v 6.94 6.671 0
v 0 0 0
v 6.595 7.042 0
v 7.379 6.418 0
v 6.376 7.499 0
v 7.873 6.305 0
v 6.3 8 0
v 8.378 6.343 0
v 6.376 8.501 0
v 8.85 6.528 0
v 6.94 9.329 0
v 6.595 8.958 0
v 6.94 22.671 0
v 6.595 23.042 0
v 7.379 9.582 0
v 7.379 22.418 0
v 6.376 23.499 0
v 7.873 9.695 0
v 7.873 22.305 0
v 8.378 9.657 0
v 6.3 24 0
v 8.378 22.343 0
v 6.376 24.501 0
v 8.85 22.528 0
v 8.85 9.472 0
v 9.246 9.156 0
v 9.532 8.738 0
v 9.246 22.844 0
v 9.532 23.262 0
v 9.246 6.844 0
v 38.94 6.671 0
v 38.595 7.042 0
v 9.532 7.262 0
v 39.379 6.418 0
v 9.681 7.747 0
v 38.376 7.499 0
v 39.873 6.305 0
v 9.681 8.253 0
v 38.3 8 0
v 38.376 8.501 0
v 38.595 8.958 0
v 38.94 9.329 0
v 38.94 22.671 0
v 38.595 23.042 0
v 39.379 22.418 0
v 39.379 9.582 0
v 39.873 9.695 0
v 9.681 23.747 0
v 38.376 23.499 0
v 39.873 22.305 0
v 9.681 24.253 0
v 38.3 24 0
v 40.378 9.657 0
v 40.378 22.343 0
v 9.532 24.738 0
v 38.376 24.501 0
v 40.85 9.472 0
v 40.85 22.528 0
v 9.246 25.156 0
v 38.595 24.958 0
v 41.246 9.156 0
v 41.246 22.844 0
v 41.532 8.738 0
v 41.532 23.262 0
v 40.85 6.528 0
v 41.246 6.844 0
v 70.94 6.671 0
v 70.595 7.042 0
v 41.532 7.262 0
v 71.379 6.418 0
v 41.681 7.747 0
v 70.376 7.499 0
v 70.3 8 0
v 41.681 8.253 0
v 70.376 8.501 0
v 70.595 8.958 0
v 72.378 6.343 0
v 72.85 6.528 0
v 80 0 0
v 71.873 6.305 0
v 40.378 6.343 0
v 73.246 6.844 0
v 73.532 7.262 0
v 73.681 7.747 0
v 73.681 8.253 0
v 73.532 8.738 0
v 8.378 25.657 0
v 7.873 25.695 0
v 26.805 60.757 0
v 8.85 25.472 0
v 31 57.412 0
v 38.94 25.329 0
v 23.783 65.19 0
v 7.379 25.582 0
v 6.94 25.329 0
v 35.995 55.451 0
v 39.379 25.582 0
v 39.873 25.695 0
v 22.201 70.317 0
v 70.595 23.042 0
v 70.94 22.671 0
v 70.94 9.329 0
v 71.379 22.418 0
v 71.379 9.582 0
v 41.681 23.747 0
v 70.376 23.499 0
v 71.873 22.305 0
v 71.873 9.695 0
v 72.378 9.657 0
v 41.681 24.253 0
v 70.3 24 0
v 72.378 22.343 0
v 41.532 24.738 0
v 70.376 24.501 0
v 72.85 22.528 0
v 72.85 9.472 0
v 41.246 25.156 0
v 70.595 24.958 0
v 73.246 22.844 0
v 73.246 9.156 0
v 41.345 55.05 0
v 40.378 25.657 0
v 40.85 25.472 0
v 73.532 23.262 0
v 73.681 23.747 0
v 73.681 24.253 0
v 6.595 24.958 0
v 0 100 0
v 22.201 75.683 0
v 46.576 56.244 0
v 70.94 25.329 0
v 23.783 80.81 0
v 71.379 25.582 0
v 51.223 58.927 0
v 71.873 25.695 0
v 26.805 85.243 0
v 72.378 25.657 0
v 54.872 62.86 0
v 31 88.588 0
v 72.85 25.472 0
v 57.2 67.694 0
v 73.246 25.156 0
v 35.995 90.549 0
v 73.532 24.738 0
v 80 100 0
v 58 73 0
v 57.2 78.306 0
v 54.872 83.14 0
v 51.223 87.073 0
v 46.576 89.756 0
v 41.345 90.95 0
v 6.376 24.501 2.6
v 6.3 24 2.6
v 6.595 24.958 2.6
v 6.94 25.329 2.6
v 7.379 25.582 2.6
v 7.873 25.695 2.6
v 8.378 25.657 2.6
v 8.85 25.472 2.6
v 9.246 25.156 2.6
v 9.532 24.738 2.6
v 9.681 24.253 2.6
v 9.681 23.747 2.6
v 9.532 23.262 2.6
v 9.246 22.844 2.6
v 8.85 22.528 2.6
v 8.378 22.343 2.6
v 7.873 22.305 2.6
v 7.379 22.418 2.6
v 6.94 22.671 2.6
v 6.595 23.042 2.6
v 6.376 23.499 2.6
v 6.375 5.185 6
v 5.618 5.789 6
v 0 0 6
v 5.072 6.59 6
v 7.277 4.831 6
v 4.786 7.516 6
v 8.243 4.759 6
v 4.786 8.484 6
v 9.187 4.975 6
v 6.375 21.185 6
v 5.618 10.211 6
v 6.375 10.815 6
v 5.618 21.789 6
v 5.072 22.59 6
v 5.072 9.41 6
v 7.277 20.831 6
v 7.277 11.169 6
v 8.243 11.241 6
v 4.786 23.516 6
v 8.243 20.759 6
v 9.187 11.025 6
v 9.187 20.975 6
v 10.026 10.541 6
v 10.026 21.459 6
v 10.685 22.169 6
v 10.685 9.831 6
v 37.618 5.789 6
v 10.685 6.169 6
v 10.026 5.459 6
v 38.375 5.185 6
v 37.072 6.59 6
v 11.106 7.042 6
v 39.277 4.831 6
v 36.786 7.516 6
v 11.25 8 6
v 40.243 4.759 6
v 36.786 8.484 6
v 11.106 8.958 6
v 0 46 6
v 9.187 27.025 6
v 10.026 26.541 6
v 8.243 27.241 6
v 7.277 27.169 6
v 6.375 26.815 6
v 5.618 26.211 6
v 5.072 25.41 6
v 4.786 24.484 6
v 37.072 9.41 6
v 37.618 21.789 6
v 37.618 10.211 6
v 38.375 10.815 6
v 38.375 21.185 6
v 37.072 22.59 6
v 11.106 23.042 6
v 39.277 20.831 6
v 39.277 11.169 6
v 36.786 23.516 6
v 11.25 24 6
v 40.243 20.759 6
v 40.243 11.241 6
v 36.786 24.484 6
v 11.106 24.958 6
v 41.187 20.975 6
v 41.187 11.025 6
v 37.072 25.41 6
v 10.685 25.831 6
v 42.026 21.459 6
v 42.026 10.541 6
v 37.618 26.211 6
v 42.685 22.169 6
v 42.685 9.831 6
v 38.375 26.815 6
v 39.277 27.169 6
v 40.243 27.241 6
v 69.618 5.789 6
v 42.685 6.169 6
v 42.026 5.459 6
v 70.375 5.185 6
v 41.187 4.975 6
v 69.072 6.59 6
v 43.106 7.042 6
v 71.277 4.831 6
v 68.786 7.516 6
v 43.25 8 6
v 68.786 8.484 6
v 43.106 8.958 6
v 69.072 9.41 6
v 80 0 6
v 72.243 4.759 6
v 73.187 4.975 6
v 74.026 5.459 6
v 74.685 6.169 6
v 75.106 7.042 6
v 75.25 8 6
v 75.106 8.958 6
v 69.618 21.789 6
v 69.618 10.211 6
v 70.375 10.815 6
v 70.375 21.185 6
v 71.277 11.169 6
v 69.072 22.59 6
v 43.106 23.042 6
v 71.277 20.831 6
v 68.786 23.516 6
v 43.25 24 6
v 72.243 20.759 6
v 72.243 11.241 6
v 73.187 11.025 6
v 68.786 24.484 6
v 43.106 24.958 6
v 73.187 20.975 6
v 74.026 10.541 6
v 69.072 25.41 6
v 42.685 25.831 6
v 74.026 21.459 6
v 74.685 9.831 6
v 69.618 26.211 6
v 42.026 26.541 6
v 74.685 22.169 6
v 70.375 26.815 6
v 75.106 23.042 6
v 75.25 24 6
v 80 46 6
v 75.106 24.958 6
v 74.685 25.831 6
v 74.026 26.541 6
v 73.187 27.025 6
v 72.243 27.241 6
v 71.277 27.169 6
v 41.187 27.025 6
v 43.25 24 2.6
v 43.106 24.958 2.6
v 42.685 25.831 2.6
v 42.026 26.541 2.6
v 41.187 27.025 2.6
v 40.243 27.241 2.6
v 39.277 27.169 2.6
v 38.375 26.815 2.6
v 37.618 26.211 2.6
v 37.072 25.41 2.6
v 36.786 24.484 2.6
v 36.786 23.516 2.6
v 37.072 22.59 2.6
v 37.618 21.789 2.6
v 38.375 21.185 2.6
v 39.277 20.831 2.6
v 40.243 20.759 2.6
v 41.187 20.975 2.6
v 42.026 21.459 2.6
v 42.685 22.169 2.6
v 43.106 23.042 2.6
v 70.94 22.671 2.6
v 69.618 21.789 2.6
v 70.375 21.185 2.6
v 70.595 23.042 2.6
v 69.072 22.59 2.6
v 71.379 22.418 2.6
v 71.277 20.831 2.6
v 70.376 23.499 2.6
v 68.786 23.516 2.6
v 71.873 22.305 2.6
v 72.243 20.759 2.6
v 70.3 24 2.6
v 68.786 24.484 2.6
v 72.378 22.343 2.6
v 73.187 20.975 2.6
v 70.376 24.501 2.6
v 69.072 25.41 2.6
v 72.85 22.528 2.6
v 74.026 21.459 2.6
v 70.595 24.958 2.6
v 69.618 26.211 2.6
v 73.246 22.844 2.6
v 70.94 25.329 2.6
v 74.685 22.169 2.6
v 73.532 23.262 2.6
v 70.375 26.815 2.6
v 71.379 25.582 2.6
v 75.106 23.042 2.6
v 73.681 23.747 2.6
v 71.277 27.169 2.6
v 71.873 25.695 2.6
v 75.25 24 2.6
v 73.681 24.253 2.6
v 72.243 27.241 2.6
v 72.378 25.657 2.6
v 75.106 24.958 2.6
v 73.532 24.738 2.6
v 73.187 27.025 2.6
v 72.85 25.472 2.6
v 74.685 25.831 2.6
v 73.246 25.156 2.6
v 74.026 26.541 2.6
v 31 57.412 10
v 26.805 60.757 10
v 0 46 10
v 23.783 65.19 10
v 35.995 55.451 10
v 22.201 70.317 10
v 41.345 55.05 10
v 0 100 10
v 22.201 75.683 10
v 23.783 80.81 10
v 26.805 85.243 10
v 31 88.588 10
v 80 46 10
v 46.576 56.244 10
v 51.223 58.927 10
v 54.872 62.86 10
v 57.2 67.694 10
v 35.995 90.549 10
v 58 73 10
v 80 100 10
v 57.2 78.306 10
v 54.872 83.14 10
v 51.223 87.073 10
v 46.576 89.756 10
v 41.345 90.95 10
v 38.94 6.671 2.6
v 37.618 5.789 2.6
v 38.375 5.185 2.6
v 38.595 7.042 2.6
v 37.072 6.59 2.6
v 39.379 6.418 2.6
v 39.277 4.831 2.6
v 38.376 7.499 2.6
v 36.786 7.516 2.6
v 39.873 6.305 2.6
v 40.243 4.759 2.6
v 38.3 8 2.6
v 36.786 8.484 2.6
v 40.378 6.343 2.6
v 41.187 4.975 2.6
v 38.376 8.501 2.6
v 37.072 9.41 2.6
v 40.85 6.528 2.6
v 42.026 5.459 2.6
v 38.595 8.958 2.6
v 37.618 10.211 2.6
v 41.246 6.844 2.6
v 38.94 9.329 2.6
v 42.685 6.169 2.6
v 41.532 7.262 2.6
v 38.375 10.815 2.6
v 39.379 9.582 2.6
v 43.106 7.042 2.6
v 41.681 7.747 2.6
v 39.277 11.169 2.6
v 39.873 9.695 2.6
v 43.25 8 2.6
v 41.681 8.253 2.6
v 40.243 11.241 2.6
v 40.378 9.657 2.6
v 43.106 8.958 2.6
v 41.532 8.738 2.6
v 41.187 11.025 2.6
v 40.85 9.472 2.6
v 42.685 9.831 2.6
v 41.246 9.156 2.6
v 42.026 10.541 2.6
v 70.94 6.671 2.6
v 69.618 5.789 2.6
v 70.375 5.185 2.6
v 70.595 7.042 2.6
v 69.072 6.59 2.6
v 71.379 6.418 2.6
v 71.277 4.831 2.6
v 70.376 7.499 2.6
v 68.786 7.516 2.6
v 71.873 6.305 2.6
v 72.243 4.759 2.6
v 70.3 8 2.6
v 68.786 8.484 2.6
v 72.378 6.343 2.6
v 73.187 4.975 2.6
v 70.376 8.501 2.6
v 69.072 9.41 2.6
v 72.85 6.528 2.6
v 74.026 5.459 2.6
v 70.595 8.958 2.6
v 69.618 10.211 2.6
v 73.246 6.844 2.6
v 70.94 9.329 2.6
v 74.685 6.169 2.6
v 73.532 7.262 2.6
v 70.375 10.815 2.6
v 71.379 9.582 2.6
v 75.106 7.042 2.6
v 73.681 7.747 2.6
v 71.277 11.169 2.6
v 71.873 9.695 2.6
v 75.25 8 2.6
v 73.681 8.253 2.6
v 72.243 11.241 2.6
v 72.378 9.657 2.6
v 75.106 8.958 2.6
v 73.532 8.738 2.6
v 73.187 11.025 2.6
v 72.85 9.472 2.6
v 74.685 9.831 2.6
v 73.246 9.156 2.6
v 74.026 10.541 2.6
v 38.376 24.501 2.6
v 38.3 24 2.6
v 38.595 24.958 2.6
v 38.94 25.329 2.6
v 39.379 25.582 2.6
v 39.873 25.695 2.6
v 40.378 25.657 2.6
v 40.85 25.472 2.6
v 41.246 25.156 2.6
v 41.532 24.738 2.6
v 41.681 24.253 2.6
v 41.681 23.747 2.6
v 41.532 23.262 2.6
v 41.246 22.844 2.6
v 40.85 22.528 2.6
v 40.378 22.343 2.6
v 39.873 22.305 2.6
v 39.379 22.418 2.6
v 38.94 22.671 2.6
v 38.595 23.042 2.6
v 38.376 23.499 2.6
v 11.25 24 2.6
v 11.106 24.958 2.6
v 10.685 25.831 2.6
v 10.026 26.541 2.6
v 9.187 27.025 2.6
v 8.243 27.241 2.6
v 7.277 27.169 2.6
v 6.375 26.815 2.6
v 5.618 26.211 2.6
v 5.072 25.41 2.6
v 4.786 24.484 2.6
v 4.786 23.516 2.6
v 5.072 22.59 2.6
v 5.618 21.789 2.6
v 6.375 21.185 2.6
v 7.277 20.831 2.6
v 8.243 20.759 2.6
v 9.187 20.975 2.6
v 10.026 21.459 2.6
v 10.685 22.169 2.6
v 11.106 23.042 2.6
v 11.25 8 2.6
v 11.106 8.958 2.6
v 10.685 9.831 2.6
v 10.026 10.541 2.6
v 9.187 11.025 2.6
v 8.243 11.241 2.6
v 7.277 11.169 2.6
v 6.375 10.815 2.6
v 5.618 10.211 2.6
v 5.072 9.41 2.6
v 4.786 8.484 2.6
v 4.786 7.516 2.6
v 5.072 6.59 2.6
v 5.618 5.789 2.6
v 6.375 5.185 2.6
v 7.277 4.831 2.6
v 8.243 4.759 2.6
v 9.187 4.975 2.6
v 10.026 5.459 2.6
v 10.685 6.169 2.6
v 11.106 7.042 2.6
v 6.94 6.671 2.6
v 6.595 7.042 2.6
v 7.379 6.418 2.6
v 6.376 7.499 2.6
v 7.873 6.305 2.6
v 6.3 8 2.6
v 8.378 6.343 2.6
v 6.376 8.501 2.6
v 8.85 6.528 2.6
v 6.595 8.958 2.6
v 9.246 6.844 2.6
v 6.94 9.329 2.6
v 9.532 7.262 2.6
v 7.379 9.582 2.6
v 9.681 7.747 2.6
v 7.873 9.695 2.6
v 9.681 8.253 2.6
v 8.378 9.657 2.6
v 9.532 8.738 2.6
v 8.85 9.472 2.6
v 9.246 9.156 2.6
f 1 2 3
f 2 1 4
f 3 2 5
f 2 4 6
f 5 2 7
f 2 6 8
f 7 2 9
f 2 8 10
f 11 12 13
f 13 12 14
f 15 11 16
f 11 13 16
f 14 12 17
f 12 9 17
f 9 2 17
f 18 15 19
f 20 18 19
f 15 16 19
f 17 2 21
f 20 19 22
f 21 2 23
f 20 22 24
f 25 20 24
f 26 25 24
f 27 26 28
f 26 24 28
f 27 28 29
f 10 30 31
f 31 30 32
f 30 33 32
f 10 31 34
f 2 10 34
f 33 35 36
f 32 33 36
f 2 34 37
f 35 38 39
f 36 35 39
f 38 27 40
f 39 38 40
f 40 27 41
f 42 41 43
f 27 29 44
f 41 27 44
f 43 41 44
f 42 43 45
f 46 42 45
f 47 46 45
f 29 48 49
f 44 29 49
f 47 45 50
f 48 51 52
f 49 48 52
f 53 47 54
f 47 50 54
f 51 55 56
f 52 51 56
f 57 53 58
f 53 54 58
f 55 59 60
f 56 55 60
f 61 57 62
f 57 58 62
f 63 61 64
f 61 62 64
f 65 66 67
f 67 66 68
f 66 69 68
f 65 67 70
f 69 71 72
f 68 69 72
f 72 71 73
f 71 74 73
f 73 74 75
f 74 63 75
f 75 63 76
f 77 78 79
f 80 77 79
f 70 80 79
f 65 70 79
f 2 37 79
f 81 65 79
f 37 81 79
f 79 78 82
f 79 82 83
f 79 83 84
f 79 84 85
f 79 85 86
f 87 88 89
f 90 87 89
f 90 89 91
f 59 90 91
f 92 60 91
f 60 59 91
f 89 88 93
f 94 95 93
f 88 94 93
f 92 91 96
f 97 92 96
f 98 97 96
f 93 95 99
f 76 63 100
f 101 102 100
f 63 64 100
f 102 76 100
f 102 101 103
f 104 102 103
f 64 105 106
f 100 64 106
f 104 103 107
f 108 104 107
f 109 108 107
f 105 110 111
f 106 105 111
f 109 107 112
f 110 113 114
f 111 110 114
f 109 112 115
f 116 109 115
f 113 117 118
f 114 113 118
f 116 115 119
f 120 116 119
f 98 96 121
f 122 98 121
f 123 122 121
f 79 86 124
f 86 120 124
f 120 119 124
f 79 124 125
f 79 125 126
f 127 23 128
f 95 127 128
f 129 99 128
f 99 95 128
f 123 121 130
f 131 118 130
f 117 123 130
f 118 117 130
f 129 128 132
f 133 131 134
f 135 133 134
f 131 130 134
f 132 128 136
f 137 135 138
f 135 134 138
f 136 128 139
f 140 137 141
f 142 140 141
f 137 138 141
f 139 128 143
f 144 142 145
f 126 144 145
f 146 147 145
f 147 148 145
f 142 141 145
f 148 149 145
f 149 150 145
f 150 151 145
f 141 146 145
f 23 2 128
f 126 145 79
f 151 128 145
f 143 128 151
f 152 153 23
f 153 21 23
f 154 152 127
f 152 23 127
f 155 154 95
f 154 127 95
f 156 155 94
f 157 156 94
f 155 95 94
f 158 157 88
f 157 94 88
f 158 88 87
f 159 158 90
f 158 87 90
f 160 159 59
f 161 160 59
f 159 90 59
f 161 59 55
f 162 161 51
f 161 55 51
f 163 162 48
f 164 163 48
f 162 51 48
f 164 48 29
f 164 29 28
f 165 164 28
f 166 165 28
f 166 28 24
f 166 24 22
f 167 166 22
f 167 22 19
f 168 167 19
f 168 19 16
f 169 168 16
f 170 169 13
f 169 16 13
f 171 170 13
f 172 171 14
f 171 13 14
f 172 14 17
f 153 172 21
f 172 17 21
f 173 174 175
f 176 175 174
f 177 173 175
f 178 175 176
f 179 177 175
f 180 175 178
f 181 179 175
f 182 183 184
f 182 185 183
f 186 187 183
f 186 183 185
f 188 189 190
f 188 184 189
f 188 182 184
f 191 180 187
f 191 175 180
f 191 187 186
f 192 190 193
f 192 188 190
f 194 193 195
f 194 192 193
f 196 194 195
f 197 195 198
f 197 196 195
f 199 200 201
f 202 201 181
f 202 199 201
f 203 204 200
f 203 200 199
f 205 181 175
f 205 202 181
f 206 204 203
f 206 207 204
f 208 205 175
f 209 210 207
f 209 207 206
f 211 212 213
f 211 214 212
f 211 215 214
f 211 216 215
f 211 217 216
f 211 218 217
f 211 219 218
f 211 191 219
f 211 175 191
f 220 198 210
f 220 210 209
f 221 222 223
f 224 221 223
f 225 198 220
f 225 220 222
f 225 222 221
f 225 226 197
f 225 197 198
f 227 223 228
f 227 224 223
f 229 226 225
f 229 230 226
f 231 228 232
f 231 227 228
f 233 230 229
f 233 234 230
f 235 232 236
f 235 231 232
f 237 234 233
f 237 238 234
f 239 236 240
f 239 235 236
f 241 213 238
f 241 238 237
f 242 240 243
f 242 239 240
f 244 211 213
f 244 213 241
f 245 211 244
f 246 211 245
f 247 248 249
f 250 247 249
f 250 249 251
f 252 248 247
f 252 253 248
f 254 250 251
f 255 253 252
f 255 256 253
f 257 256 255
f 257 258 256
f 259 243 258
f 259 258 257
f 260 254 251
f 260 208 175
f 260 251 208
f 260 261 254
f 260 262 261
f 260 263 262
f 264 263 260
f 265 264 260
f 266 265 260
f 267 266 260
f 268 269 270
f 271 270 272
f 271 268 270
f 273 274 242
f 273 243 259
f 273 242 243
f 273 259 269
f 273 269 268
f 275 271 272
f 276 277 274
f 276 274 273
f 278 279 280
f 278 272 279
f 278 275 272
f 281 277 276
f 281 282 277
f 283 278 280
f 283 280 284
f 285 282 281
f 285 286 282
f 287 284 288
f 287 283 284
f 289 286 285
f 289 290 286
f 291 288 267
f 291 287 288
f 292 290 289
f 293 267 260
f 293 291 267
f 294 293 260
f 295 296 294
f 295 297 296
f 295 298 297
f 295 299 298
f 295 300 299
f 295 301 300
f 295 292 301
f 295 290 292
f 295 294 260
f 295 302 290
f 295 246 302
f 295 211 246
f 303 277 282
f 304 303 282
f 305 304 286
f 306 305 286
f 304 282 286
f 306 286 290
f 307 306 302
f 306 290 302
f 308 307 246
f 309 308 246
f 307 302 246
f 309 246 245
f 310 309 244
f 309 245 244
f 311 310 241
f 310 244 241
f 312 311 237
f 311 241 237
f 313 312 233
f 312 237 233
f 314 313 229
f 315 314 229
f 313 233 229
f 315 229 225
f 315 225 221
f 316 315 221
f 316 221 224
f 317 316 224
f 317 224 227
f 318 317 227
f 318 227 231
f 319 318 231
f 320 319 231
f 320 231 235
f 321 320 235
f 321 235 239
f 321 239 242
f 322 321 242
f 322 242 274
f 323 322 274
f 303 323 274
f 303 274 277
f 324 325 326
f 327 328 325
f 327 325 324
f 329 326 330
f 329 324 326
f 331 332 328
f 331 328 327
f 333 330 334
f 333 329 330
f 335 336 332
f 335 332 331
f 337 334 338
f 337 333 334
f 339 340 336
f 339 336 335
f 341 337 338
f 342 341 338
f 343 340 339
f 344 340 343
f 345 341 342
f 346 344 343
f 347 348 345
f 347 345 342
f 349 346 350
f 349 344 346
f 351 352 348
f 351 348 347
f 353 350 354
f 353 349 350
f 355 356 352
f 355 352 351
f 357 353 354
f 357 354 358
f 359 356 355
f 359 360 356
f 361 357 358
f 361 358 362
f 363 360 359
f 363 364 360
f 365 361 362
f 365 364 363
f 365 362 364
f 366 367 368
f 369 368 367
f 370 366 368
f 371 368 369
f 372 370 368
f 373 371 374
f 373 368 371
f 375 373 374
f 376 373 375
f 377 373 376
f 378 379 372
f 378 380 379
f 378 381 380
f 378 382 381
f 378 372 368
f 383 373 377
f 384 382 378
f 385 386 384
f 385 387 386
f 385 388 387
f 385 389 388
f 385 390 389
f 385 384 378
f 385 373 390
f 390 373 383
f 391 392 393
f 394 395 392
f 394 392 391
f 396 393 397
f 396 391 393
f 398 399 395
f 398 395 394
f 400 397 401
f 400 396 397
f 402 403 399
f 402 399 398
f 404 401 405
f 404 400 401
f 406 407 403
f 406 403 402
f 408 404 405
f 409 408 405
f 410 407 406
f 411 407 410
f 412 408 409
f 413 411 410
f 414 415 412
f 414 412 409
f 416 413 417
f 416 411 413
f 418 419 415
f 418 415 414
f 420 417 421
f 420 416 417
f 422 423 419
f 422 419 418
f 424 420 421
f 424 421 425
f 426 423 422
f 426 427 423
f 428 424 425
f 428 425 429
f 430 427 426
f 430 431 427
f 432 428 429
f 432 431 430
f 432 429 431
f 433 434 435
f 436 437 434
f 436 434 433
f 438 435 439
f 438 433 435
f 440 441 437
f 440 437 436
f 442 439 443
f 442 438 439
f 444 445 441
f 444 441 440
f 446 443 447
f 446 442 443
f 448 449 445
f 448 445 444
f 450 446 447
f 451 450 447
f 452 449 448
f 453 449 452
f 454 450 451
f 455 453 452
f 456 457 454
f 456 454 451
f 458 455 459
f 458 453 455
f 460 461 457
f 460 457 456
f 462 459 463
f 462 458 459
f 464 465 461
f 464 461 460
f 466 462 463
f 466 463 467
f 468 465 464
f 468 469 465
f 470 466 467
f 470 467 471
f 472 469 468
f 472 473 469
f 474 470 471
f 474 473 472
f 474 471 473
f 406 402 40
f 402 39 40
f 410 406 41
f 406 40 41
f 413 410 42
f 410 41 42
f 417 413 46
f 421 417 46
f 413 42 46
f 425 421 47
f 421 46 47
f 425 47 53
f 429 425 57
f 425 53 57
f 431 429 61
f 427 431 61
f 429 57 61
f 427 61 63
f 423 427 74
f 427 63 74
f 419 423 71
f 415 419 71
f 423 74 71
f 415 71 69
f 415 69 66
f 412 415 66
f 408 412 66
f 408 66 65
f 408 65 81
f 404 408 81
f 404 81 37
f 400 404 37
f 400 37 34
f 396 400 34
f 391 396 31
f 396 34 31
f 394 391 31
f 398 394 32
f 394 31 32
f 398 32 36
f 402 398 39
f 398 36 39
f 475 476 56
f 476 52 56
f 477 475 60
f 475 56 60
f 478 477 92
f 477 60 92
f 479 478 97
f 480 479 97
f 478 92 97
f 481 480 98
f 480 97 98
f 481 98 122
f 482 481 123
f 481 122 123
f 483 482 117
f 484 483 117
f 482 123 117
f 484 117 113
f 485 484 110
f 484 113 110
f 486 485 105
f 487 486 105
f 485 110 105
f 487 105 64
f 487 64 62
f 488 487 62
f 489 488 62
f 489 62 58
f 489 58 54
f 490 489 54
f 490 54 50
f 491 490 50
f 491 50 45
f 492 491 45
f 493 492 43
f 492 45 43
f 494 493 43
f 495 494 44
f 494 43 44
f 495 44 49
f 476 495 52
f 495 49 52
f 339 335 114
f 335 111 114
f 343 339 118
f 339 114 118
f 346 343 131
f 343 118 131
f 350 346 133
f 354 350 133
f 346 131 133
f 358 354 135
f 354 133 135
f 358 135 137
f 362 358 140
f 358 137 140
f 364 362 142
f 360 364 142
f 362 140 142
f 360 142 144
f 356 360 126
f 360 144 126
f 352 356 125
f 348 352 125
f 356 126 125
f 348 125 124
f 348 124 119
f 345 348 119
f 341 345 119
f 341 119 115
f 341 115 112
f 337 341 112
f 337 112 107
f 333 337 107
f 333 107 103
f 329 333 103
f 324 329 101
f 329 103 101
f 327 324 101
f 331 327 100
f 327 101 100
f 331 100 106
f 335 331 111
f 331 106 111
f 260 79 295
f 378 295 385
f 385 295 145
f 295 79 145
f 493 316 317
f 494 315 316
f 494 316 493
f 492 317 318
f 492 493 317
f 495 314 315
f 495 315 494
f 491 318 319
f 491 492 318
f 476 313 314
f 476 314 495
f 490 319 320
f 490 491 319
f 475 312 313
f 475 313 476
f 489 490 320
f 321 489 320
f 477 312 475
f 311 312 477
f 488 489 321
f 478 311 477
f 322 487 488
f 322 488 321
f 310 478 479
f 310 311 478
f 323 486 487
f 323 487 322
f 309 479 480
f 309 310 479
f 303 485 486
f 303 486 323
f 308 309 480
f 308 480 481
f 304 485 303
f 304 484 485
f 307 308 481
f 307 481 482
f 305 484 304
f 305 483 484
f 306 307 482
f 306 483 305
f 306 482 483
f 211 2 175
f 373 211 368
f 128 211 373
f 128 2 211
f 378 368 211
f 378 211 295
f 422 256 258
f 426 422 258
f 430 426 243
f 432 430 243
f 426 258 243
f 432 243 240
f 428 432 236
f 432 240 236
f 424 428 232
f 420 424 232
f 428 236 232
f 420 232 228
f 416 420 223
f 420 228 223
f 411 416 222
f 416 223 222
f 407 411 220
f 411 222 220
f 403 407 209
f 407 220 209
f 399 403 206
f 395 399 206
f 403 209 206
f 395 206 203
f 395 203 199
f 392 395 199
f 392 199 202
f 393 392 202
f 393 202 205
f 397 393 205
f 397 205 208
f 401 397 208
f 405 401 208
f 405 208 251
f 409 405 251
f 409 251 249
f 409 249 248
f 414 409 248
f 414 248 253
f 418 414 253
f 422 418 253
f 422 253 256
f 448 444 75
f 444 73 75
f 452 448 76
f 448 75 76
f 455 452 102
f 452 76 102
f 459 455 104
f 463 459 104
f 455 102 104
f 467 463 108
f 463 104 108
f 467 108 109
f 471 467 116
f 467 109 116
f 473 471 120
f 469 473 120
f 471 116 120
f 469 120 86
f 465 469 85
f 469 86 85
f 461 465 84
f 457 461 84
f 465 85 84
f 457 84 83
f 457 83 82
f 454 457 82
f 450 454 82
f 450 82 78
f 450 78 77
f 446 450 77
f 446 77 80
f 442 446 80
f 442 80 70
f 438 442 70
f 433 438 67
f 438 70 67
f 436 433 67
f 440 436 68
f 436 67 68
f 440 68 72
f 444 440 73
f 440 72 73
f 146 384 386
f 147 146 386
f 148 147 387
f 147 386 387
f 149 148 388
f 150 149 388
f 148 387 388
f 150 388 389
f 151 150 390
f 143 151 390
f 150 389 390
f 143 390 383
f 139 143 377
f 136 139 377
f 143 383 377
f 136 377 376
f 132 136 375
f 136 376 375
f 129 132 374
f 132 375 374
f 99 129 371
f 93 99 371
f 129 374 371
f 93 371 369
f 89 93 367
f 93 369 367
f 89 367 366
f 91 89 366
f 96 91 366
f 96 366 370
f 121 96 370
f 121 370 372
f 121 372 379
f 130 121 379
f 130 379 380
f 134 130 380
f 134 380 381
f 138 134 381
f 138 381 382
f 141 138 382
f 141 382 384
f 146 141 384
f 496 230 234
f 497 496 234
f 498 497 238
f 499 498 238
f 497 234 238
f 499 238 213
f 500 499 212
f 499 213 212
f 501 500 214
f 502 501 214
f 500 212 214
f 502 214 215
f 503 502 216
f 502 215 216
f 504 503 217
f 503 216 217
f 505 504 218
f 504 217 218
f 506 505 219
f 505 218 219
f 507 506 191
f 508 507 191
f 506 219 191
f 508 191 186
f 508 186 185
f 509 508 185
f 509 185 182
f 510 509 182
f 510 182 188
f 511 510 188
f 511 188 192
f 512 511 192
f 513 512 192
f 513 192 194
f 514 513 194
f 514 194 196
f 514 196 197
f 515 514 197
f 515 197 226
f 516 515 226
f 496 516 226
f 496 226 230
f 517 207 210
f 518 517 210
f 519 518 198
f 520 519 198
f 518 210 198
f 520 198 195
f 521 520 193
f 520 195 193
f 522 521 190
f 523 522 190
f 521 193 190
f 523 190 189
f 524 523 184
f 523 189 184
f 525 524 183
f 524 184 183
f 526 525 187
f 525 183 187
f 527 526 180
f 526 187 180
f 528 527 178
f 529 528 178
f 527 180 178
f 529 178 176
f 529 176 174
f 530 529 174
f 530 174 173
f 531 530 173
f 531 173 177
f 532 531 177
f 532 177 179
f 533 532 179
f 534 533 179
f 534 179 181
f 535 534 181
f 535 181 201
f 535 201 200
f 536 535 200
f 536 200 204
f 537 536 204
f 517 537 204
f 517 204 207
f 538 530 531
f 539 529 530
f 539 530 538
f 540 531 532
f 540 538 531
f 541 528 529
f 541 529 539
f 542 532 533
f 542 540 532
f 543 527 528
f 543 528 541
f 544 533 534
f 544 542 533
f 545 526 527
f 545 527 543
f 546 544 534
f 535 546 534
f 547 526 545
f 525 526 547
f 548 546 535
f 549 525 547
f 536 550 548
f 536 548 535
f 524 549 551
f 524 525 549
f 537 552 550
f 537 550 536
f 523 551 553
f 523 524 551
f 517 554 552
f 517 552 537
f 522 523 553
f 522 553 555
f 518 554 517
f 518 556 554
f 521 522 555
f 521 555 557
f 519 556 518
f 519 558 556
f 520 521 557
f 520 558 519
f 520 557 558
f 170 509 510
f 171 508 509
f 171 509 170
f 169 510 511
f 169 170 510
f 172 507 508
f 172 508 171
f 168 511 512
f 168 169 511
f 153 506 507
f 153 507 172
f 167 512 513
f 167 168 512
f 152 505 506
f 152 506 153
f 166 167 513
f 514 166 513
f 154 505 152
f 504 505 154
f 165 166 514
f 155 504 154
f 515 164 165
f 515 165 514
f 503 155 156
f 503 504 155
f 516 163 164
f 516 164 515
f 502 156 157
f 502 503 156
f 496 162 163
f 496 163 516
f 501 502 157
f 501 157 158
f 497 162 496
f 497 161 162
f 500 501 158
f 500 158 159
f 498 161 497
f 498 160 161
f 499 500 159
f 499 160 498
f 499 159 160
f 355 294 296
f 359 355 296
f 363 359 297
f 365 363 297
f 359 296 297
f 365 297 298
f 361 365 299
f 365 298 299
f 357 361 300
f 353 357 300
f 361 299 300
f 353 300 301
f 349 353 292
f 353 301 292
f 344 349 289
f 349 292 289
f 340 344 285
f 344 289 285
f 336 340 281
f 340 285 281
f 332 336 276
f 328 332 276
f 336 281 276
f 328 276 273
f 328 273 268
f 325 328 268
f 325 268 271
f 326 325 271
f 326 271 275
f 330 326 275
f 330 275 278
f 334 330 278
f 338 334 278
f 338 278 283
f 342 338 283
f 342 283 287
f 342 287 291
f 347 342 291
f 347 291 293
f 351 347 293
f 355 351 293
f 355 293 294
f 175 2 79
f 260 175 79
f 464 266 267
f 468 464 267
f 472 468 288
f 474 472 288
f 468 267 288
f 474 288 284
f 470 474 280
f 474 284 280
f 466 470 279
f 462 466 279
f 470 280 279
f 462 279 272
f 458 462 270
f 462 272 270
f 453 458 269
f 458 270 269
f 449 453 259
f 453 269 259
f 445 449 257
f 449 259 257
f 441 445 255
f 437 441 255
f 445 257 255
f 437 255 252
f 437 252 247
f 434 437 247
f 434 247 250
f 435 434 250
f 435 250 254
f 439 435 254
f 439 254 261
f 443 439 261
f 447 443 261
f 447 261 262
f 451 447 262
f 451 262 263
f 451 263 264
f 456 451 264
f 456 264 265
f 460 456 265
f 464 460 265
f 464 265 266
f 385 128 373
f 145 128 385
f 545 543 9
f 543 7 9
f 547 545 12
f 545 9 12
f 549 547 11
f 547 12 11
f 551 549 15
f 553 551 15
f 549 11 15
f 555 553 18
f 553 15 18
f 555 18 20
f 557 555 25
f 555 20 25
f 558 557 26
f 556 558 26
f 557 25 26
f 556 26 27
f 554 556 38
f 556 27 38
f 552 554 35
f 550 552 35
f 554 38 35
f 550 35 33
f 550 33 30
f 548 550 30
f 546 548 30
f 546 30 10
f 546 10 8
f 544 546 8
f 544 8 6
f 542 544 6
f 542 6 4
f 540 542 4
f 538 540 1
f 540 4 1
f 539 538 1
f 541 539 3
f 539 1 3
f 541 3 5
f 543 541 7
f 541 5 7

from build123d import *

# Parameters (mm, degrees)
SKETCH1_W                                           = 80
SKETCH1_H                                           = 100
BOSS_EXTRUDE1_DEPTH                                 = 10
SKETCH2_R                                           = 18
CUT_EXTRUDE1_DEPTH                                  = 129.452325787
SKETCH3_W                                           = 80
SKETCH3_H                                           = 46
CUT_EXTRUDE2_DEPTH                                  = 4
CBORE_FOR_M3_HEX_SOCKET_HEAD_CAP_SCREW1_D           = 3.4
CBORE_FOR_M3_HEX_SOCKET_HEAD_CAP_SCREW1_CBORE_D     = 6.5
CBORE_FOR_M3_HEX_SOCKET_HEAD_CAP_SCREW1_CBORE_DEPTH = 3.4


with BuildPart() as part:
    # Sketch1 → Boss-Extrude1 (new body)
    with BuildSketch(Plane.XY):
        with Locations((40, 50)):
            Rectangle(SKETCH1_W, SKETCH1_H)
    extrude(amount=BOSS_EXTRUDE1_DEPTH)

    # Sketch2 → Cut-Extrude1 (cut, through all)
    with BuildSketch(Plane.XY.offset(10)):
        with Locations((40, 73)):
            Circle(SKETCH2_R)
    extrude(amount=-CUT_EXTRUDE1_DEPTH, mode=Mode.SUBTRACT)

    # Sketch3 → Cut-Extrude2 (cut)
    with BuildSketch(Plane.XY.offset(10)):
        with Locations((40, 23)):
            Rectangle(SKETCH3_W, SKETCH3_H)
    extrude(amount=-CUT_EXTRUDE2_DEPTH, mode=Mode.SUBTRACT)

    # CBORE for M3 Hex Socket Head Cap Screw1 (through all)
    with Locations(Plane.XY.offset(6)):
        with Locations((8, 8), (40, 8), (72, 8), (40, 24), (72, 24), (8, 24)):
            CounterBoreHole(CBORE_FOR_M3_HEX_SOCKET_HEAD_CAP_SCREW1_D / 2, CBORE_FOR_M3_HEX_SOCKET_HEAD_CAP_SCREW1_CBORE_D / 2, CBORE_FOR_M3_HEX_SOCKET_HEAD_CAP_SCREW1_CBORE_DEPTH)


solid = part.part
